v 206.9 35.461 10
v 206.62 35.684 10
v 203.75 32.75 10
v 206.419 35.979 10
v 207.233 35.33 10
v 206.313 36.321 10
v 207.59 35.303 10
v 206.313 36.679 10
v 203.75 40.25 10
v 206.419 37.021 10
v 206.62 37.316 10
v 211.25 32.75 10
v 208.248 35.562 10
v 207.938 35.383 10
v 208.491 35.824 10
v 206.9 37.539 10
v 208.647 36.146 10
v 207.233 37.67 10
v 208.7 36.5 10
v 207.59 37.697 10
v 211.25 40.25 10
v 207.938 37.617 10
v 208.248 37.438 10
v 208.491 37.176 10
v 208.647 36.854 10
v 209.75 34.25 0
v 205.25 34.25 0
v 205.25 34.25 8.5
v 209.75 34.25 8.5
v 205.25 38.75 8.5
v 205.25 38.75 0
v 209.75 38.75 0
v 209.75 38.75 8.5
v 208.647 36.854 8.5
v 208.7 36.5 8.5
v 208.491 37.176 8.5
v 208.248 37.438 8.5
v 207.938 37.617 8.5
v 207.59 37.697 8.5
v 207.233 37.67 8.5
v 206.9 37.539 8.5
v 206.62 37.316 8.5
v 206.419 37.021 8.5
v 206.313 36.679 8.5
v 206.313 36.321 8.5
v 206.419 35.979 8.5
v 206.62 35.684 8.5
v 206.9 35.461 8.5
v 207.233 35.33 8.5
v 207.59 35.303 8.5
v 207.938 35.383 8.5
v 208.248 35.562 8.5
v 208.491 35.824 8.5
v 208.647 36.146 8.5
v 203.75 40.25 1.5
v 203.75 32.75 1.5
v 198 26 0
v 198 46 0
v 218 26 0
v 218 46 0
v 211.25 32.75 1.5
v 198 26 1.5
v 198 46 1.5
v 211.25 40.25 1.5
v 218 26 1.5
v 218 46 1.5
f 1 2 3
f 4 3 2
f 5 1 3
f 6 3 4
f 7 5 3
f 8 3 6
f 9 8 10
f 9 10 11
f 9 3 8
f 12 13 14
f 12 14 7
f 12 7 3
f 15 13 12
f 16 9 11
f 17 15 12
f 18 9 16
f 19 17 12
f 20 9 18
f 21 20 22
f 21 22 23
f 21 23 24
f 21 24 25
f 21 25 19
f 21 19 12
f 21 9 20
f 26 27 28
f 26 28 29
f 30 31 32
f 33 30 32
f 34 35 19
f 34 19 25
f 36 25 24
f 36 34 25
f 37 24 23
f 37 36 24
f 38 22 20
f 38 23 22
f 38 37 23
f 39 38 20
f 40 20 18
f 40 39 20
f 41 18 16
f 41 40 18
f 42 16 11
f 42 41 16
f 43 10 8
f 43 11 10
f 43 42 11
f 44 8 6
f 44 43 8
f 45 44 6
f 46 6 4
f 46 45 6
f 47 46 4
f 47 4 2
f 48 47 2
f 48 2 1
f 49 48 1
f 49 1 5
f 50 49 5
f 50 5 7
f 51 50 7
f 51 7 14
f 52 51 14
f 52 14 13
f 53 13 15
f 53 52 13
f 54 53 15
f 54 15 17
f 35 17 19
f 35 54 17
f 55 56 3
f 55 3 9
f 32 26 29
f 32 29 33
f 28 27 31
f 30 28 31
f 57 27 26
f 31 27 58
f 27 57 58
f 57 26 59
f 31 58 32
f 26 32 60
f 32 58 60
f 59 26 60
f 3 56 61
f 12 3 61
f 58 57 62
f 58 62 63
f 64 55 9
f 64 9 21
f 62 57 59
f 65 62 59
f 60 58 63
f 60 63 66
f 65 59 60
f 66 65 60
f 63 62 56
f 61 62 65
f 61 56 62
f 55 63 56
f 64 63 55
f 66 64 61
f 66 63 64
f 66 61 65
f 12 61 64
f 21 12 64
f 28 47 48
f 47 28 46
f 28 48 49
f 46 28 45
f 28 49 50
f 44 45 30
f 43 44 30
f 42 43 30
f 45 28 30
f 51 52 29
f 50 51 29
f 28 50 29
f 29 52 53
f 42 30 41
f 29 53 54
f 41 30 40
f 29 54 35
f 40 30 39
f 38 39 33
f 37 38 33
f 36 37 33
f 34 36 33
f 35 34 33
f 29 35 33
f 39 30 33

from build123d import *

# Parameters (mm, degrees)
BOX049_W          = 4.5
BOX049_H          = 4.5
BOX049_DEPTH      = 10
BOX048_W          = 20
BOX048_H          = 20
BOX048_DEPTH      = 1.5
CYLINDER034_R     = 1.2
CYLINDER034_DEPTH = 10
BOX047_W          = 4.5
BOX047_H          = 4.5
BOX047_DEPTH      = 10
BOX046_W          = 7.5
BOX046_H          = 7.5
BOX046_DEPTH      = 10


with BuildPart() as cube049:
    # Box049 → Box049 (new body)
    with BuildSketch(Plane(origin=(205.25, 34.25, -5), x_dir=(1, 0, 0), z_dir=(0, 0, 1))):
        with Locations((2.25, 2.25)):
            Rectangle(BOX049_W, BOX049_H)
    extrude(amount=BOX049_DEPTH)


with BuildPart() as cut057:
    # Box048 → Box048 (new body)
    with BuildSketch(Plane(origin=(198, 26, 0), x_dir=(1, 0, 0), z_dir=(0, 0, 1))):
        with Locations((10, 10)):
            Rectangle(BOX048_W, BOX048_H)
    extrude(amount=BOX048_DEPTH)

    # Cut057: cut Cube049
    add(cube049.part, mode=Mode.SUBTRACT)


with BuildPart() as cylinder034:
    # Cylinder034 → Cylinder034 (new body)
    with BuildSketch(Plane(origin=(7.5, 16.5, 105), x_dir=(1, 0, 0), z_dir=(0, 0, 1))):
        Circle(CYLINDER034_R)
    extrude(amount=CYLINDER034_DEPTH)


with BuildPart() as cube047:
    # Box047 → Box047 (new body)
    with BuildSketch(Plane(origin=(5.25, 14.25, 98.5), x_dir=(1, 0, 0), z_dir=(0, 0, 1))):
        with Locations((2.25, 2.25)):
            Rectangle(BOX047_W, BOX047_H)
    extrude(amount=BOX047_DEPTH)


with BuildPart() as testpcbmount:
    # Box046 → Box046 (new body)
    with BuildSketch(Plane(origin=(3.75, 12.75, 100), x_dir=(1, 0, 0), z_dir=(0, 0, 1))):
        with Locations((3.75, 3.75)):
            Rectangle(BOX046_W, BOX046_H)
    extrude(amount=BOX046_DEPTH)

    # Cut055: cut Cube047
    add(cube047.part, mode=Mode.SUBTRACT)

    # Cut056: cut Cylinder034
    add(cylinder034.part, mode=Mode.SUBTRACT)


with BuildPart() as testpcbmount_1:
    # Cut056 placement: moved
    add(testpcbmount.part.moved(Location((200, 20, -100))))

    # Connect006: union Cut057
    add(cut057.part)


solid = testpcbmount_1.part
